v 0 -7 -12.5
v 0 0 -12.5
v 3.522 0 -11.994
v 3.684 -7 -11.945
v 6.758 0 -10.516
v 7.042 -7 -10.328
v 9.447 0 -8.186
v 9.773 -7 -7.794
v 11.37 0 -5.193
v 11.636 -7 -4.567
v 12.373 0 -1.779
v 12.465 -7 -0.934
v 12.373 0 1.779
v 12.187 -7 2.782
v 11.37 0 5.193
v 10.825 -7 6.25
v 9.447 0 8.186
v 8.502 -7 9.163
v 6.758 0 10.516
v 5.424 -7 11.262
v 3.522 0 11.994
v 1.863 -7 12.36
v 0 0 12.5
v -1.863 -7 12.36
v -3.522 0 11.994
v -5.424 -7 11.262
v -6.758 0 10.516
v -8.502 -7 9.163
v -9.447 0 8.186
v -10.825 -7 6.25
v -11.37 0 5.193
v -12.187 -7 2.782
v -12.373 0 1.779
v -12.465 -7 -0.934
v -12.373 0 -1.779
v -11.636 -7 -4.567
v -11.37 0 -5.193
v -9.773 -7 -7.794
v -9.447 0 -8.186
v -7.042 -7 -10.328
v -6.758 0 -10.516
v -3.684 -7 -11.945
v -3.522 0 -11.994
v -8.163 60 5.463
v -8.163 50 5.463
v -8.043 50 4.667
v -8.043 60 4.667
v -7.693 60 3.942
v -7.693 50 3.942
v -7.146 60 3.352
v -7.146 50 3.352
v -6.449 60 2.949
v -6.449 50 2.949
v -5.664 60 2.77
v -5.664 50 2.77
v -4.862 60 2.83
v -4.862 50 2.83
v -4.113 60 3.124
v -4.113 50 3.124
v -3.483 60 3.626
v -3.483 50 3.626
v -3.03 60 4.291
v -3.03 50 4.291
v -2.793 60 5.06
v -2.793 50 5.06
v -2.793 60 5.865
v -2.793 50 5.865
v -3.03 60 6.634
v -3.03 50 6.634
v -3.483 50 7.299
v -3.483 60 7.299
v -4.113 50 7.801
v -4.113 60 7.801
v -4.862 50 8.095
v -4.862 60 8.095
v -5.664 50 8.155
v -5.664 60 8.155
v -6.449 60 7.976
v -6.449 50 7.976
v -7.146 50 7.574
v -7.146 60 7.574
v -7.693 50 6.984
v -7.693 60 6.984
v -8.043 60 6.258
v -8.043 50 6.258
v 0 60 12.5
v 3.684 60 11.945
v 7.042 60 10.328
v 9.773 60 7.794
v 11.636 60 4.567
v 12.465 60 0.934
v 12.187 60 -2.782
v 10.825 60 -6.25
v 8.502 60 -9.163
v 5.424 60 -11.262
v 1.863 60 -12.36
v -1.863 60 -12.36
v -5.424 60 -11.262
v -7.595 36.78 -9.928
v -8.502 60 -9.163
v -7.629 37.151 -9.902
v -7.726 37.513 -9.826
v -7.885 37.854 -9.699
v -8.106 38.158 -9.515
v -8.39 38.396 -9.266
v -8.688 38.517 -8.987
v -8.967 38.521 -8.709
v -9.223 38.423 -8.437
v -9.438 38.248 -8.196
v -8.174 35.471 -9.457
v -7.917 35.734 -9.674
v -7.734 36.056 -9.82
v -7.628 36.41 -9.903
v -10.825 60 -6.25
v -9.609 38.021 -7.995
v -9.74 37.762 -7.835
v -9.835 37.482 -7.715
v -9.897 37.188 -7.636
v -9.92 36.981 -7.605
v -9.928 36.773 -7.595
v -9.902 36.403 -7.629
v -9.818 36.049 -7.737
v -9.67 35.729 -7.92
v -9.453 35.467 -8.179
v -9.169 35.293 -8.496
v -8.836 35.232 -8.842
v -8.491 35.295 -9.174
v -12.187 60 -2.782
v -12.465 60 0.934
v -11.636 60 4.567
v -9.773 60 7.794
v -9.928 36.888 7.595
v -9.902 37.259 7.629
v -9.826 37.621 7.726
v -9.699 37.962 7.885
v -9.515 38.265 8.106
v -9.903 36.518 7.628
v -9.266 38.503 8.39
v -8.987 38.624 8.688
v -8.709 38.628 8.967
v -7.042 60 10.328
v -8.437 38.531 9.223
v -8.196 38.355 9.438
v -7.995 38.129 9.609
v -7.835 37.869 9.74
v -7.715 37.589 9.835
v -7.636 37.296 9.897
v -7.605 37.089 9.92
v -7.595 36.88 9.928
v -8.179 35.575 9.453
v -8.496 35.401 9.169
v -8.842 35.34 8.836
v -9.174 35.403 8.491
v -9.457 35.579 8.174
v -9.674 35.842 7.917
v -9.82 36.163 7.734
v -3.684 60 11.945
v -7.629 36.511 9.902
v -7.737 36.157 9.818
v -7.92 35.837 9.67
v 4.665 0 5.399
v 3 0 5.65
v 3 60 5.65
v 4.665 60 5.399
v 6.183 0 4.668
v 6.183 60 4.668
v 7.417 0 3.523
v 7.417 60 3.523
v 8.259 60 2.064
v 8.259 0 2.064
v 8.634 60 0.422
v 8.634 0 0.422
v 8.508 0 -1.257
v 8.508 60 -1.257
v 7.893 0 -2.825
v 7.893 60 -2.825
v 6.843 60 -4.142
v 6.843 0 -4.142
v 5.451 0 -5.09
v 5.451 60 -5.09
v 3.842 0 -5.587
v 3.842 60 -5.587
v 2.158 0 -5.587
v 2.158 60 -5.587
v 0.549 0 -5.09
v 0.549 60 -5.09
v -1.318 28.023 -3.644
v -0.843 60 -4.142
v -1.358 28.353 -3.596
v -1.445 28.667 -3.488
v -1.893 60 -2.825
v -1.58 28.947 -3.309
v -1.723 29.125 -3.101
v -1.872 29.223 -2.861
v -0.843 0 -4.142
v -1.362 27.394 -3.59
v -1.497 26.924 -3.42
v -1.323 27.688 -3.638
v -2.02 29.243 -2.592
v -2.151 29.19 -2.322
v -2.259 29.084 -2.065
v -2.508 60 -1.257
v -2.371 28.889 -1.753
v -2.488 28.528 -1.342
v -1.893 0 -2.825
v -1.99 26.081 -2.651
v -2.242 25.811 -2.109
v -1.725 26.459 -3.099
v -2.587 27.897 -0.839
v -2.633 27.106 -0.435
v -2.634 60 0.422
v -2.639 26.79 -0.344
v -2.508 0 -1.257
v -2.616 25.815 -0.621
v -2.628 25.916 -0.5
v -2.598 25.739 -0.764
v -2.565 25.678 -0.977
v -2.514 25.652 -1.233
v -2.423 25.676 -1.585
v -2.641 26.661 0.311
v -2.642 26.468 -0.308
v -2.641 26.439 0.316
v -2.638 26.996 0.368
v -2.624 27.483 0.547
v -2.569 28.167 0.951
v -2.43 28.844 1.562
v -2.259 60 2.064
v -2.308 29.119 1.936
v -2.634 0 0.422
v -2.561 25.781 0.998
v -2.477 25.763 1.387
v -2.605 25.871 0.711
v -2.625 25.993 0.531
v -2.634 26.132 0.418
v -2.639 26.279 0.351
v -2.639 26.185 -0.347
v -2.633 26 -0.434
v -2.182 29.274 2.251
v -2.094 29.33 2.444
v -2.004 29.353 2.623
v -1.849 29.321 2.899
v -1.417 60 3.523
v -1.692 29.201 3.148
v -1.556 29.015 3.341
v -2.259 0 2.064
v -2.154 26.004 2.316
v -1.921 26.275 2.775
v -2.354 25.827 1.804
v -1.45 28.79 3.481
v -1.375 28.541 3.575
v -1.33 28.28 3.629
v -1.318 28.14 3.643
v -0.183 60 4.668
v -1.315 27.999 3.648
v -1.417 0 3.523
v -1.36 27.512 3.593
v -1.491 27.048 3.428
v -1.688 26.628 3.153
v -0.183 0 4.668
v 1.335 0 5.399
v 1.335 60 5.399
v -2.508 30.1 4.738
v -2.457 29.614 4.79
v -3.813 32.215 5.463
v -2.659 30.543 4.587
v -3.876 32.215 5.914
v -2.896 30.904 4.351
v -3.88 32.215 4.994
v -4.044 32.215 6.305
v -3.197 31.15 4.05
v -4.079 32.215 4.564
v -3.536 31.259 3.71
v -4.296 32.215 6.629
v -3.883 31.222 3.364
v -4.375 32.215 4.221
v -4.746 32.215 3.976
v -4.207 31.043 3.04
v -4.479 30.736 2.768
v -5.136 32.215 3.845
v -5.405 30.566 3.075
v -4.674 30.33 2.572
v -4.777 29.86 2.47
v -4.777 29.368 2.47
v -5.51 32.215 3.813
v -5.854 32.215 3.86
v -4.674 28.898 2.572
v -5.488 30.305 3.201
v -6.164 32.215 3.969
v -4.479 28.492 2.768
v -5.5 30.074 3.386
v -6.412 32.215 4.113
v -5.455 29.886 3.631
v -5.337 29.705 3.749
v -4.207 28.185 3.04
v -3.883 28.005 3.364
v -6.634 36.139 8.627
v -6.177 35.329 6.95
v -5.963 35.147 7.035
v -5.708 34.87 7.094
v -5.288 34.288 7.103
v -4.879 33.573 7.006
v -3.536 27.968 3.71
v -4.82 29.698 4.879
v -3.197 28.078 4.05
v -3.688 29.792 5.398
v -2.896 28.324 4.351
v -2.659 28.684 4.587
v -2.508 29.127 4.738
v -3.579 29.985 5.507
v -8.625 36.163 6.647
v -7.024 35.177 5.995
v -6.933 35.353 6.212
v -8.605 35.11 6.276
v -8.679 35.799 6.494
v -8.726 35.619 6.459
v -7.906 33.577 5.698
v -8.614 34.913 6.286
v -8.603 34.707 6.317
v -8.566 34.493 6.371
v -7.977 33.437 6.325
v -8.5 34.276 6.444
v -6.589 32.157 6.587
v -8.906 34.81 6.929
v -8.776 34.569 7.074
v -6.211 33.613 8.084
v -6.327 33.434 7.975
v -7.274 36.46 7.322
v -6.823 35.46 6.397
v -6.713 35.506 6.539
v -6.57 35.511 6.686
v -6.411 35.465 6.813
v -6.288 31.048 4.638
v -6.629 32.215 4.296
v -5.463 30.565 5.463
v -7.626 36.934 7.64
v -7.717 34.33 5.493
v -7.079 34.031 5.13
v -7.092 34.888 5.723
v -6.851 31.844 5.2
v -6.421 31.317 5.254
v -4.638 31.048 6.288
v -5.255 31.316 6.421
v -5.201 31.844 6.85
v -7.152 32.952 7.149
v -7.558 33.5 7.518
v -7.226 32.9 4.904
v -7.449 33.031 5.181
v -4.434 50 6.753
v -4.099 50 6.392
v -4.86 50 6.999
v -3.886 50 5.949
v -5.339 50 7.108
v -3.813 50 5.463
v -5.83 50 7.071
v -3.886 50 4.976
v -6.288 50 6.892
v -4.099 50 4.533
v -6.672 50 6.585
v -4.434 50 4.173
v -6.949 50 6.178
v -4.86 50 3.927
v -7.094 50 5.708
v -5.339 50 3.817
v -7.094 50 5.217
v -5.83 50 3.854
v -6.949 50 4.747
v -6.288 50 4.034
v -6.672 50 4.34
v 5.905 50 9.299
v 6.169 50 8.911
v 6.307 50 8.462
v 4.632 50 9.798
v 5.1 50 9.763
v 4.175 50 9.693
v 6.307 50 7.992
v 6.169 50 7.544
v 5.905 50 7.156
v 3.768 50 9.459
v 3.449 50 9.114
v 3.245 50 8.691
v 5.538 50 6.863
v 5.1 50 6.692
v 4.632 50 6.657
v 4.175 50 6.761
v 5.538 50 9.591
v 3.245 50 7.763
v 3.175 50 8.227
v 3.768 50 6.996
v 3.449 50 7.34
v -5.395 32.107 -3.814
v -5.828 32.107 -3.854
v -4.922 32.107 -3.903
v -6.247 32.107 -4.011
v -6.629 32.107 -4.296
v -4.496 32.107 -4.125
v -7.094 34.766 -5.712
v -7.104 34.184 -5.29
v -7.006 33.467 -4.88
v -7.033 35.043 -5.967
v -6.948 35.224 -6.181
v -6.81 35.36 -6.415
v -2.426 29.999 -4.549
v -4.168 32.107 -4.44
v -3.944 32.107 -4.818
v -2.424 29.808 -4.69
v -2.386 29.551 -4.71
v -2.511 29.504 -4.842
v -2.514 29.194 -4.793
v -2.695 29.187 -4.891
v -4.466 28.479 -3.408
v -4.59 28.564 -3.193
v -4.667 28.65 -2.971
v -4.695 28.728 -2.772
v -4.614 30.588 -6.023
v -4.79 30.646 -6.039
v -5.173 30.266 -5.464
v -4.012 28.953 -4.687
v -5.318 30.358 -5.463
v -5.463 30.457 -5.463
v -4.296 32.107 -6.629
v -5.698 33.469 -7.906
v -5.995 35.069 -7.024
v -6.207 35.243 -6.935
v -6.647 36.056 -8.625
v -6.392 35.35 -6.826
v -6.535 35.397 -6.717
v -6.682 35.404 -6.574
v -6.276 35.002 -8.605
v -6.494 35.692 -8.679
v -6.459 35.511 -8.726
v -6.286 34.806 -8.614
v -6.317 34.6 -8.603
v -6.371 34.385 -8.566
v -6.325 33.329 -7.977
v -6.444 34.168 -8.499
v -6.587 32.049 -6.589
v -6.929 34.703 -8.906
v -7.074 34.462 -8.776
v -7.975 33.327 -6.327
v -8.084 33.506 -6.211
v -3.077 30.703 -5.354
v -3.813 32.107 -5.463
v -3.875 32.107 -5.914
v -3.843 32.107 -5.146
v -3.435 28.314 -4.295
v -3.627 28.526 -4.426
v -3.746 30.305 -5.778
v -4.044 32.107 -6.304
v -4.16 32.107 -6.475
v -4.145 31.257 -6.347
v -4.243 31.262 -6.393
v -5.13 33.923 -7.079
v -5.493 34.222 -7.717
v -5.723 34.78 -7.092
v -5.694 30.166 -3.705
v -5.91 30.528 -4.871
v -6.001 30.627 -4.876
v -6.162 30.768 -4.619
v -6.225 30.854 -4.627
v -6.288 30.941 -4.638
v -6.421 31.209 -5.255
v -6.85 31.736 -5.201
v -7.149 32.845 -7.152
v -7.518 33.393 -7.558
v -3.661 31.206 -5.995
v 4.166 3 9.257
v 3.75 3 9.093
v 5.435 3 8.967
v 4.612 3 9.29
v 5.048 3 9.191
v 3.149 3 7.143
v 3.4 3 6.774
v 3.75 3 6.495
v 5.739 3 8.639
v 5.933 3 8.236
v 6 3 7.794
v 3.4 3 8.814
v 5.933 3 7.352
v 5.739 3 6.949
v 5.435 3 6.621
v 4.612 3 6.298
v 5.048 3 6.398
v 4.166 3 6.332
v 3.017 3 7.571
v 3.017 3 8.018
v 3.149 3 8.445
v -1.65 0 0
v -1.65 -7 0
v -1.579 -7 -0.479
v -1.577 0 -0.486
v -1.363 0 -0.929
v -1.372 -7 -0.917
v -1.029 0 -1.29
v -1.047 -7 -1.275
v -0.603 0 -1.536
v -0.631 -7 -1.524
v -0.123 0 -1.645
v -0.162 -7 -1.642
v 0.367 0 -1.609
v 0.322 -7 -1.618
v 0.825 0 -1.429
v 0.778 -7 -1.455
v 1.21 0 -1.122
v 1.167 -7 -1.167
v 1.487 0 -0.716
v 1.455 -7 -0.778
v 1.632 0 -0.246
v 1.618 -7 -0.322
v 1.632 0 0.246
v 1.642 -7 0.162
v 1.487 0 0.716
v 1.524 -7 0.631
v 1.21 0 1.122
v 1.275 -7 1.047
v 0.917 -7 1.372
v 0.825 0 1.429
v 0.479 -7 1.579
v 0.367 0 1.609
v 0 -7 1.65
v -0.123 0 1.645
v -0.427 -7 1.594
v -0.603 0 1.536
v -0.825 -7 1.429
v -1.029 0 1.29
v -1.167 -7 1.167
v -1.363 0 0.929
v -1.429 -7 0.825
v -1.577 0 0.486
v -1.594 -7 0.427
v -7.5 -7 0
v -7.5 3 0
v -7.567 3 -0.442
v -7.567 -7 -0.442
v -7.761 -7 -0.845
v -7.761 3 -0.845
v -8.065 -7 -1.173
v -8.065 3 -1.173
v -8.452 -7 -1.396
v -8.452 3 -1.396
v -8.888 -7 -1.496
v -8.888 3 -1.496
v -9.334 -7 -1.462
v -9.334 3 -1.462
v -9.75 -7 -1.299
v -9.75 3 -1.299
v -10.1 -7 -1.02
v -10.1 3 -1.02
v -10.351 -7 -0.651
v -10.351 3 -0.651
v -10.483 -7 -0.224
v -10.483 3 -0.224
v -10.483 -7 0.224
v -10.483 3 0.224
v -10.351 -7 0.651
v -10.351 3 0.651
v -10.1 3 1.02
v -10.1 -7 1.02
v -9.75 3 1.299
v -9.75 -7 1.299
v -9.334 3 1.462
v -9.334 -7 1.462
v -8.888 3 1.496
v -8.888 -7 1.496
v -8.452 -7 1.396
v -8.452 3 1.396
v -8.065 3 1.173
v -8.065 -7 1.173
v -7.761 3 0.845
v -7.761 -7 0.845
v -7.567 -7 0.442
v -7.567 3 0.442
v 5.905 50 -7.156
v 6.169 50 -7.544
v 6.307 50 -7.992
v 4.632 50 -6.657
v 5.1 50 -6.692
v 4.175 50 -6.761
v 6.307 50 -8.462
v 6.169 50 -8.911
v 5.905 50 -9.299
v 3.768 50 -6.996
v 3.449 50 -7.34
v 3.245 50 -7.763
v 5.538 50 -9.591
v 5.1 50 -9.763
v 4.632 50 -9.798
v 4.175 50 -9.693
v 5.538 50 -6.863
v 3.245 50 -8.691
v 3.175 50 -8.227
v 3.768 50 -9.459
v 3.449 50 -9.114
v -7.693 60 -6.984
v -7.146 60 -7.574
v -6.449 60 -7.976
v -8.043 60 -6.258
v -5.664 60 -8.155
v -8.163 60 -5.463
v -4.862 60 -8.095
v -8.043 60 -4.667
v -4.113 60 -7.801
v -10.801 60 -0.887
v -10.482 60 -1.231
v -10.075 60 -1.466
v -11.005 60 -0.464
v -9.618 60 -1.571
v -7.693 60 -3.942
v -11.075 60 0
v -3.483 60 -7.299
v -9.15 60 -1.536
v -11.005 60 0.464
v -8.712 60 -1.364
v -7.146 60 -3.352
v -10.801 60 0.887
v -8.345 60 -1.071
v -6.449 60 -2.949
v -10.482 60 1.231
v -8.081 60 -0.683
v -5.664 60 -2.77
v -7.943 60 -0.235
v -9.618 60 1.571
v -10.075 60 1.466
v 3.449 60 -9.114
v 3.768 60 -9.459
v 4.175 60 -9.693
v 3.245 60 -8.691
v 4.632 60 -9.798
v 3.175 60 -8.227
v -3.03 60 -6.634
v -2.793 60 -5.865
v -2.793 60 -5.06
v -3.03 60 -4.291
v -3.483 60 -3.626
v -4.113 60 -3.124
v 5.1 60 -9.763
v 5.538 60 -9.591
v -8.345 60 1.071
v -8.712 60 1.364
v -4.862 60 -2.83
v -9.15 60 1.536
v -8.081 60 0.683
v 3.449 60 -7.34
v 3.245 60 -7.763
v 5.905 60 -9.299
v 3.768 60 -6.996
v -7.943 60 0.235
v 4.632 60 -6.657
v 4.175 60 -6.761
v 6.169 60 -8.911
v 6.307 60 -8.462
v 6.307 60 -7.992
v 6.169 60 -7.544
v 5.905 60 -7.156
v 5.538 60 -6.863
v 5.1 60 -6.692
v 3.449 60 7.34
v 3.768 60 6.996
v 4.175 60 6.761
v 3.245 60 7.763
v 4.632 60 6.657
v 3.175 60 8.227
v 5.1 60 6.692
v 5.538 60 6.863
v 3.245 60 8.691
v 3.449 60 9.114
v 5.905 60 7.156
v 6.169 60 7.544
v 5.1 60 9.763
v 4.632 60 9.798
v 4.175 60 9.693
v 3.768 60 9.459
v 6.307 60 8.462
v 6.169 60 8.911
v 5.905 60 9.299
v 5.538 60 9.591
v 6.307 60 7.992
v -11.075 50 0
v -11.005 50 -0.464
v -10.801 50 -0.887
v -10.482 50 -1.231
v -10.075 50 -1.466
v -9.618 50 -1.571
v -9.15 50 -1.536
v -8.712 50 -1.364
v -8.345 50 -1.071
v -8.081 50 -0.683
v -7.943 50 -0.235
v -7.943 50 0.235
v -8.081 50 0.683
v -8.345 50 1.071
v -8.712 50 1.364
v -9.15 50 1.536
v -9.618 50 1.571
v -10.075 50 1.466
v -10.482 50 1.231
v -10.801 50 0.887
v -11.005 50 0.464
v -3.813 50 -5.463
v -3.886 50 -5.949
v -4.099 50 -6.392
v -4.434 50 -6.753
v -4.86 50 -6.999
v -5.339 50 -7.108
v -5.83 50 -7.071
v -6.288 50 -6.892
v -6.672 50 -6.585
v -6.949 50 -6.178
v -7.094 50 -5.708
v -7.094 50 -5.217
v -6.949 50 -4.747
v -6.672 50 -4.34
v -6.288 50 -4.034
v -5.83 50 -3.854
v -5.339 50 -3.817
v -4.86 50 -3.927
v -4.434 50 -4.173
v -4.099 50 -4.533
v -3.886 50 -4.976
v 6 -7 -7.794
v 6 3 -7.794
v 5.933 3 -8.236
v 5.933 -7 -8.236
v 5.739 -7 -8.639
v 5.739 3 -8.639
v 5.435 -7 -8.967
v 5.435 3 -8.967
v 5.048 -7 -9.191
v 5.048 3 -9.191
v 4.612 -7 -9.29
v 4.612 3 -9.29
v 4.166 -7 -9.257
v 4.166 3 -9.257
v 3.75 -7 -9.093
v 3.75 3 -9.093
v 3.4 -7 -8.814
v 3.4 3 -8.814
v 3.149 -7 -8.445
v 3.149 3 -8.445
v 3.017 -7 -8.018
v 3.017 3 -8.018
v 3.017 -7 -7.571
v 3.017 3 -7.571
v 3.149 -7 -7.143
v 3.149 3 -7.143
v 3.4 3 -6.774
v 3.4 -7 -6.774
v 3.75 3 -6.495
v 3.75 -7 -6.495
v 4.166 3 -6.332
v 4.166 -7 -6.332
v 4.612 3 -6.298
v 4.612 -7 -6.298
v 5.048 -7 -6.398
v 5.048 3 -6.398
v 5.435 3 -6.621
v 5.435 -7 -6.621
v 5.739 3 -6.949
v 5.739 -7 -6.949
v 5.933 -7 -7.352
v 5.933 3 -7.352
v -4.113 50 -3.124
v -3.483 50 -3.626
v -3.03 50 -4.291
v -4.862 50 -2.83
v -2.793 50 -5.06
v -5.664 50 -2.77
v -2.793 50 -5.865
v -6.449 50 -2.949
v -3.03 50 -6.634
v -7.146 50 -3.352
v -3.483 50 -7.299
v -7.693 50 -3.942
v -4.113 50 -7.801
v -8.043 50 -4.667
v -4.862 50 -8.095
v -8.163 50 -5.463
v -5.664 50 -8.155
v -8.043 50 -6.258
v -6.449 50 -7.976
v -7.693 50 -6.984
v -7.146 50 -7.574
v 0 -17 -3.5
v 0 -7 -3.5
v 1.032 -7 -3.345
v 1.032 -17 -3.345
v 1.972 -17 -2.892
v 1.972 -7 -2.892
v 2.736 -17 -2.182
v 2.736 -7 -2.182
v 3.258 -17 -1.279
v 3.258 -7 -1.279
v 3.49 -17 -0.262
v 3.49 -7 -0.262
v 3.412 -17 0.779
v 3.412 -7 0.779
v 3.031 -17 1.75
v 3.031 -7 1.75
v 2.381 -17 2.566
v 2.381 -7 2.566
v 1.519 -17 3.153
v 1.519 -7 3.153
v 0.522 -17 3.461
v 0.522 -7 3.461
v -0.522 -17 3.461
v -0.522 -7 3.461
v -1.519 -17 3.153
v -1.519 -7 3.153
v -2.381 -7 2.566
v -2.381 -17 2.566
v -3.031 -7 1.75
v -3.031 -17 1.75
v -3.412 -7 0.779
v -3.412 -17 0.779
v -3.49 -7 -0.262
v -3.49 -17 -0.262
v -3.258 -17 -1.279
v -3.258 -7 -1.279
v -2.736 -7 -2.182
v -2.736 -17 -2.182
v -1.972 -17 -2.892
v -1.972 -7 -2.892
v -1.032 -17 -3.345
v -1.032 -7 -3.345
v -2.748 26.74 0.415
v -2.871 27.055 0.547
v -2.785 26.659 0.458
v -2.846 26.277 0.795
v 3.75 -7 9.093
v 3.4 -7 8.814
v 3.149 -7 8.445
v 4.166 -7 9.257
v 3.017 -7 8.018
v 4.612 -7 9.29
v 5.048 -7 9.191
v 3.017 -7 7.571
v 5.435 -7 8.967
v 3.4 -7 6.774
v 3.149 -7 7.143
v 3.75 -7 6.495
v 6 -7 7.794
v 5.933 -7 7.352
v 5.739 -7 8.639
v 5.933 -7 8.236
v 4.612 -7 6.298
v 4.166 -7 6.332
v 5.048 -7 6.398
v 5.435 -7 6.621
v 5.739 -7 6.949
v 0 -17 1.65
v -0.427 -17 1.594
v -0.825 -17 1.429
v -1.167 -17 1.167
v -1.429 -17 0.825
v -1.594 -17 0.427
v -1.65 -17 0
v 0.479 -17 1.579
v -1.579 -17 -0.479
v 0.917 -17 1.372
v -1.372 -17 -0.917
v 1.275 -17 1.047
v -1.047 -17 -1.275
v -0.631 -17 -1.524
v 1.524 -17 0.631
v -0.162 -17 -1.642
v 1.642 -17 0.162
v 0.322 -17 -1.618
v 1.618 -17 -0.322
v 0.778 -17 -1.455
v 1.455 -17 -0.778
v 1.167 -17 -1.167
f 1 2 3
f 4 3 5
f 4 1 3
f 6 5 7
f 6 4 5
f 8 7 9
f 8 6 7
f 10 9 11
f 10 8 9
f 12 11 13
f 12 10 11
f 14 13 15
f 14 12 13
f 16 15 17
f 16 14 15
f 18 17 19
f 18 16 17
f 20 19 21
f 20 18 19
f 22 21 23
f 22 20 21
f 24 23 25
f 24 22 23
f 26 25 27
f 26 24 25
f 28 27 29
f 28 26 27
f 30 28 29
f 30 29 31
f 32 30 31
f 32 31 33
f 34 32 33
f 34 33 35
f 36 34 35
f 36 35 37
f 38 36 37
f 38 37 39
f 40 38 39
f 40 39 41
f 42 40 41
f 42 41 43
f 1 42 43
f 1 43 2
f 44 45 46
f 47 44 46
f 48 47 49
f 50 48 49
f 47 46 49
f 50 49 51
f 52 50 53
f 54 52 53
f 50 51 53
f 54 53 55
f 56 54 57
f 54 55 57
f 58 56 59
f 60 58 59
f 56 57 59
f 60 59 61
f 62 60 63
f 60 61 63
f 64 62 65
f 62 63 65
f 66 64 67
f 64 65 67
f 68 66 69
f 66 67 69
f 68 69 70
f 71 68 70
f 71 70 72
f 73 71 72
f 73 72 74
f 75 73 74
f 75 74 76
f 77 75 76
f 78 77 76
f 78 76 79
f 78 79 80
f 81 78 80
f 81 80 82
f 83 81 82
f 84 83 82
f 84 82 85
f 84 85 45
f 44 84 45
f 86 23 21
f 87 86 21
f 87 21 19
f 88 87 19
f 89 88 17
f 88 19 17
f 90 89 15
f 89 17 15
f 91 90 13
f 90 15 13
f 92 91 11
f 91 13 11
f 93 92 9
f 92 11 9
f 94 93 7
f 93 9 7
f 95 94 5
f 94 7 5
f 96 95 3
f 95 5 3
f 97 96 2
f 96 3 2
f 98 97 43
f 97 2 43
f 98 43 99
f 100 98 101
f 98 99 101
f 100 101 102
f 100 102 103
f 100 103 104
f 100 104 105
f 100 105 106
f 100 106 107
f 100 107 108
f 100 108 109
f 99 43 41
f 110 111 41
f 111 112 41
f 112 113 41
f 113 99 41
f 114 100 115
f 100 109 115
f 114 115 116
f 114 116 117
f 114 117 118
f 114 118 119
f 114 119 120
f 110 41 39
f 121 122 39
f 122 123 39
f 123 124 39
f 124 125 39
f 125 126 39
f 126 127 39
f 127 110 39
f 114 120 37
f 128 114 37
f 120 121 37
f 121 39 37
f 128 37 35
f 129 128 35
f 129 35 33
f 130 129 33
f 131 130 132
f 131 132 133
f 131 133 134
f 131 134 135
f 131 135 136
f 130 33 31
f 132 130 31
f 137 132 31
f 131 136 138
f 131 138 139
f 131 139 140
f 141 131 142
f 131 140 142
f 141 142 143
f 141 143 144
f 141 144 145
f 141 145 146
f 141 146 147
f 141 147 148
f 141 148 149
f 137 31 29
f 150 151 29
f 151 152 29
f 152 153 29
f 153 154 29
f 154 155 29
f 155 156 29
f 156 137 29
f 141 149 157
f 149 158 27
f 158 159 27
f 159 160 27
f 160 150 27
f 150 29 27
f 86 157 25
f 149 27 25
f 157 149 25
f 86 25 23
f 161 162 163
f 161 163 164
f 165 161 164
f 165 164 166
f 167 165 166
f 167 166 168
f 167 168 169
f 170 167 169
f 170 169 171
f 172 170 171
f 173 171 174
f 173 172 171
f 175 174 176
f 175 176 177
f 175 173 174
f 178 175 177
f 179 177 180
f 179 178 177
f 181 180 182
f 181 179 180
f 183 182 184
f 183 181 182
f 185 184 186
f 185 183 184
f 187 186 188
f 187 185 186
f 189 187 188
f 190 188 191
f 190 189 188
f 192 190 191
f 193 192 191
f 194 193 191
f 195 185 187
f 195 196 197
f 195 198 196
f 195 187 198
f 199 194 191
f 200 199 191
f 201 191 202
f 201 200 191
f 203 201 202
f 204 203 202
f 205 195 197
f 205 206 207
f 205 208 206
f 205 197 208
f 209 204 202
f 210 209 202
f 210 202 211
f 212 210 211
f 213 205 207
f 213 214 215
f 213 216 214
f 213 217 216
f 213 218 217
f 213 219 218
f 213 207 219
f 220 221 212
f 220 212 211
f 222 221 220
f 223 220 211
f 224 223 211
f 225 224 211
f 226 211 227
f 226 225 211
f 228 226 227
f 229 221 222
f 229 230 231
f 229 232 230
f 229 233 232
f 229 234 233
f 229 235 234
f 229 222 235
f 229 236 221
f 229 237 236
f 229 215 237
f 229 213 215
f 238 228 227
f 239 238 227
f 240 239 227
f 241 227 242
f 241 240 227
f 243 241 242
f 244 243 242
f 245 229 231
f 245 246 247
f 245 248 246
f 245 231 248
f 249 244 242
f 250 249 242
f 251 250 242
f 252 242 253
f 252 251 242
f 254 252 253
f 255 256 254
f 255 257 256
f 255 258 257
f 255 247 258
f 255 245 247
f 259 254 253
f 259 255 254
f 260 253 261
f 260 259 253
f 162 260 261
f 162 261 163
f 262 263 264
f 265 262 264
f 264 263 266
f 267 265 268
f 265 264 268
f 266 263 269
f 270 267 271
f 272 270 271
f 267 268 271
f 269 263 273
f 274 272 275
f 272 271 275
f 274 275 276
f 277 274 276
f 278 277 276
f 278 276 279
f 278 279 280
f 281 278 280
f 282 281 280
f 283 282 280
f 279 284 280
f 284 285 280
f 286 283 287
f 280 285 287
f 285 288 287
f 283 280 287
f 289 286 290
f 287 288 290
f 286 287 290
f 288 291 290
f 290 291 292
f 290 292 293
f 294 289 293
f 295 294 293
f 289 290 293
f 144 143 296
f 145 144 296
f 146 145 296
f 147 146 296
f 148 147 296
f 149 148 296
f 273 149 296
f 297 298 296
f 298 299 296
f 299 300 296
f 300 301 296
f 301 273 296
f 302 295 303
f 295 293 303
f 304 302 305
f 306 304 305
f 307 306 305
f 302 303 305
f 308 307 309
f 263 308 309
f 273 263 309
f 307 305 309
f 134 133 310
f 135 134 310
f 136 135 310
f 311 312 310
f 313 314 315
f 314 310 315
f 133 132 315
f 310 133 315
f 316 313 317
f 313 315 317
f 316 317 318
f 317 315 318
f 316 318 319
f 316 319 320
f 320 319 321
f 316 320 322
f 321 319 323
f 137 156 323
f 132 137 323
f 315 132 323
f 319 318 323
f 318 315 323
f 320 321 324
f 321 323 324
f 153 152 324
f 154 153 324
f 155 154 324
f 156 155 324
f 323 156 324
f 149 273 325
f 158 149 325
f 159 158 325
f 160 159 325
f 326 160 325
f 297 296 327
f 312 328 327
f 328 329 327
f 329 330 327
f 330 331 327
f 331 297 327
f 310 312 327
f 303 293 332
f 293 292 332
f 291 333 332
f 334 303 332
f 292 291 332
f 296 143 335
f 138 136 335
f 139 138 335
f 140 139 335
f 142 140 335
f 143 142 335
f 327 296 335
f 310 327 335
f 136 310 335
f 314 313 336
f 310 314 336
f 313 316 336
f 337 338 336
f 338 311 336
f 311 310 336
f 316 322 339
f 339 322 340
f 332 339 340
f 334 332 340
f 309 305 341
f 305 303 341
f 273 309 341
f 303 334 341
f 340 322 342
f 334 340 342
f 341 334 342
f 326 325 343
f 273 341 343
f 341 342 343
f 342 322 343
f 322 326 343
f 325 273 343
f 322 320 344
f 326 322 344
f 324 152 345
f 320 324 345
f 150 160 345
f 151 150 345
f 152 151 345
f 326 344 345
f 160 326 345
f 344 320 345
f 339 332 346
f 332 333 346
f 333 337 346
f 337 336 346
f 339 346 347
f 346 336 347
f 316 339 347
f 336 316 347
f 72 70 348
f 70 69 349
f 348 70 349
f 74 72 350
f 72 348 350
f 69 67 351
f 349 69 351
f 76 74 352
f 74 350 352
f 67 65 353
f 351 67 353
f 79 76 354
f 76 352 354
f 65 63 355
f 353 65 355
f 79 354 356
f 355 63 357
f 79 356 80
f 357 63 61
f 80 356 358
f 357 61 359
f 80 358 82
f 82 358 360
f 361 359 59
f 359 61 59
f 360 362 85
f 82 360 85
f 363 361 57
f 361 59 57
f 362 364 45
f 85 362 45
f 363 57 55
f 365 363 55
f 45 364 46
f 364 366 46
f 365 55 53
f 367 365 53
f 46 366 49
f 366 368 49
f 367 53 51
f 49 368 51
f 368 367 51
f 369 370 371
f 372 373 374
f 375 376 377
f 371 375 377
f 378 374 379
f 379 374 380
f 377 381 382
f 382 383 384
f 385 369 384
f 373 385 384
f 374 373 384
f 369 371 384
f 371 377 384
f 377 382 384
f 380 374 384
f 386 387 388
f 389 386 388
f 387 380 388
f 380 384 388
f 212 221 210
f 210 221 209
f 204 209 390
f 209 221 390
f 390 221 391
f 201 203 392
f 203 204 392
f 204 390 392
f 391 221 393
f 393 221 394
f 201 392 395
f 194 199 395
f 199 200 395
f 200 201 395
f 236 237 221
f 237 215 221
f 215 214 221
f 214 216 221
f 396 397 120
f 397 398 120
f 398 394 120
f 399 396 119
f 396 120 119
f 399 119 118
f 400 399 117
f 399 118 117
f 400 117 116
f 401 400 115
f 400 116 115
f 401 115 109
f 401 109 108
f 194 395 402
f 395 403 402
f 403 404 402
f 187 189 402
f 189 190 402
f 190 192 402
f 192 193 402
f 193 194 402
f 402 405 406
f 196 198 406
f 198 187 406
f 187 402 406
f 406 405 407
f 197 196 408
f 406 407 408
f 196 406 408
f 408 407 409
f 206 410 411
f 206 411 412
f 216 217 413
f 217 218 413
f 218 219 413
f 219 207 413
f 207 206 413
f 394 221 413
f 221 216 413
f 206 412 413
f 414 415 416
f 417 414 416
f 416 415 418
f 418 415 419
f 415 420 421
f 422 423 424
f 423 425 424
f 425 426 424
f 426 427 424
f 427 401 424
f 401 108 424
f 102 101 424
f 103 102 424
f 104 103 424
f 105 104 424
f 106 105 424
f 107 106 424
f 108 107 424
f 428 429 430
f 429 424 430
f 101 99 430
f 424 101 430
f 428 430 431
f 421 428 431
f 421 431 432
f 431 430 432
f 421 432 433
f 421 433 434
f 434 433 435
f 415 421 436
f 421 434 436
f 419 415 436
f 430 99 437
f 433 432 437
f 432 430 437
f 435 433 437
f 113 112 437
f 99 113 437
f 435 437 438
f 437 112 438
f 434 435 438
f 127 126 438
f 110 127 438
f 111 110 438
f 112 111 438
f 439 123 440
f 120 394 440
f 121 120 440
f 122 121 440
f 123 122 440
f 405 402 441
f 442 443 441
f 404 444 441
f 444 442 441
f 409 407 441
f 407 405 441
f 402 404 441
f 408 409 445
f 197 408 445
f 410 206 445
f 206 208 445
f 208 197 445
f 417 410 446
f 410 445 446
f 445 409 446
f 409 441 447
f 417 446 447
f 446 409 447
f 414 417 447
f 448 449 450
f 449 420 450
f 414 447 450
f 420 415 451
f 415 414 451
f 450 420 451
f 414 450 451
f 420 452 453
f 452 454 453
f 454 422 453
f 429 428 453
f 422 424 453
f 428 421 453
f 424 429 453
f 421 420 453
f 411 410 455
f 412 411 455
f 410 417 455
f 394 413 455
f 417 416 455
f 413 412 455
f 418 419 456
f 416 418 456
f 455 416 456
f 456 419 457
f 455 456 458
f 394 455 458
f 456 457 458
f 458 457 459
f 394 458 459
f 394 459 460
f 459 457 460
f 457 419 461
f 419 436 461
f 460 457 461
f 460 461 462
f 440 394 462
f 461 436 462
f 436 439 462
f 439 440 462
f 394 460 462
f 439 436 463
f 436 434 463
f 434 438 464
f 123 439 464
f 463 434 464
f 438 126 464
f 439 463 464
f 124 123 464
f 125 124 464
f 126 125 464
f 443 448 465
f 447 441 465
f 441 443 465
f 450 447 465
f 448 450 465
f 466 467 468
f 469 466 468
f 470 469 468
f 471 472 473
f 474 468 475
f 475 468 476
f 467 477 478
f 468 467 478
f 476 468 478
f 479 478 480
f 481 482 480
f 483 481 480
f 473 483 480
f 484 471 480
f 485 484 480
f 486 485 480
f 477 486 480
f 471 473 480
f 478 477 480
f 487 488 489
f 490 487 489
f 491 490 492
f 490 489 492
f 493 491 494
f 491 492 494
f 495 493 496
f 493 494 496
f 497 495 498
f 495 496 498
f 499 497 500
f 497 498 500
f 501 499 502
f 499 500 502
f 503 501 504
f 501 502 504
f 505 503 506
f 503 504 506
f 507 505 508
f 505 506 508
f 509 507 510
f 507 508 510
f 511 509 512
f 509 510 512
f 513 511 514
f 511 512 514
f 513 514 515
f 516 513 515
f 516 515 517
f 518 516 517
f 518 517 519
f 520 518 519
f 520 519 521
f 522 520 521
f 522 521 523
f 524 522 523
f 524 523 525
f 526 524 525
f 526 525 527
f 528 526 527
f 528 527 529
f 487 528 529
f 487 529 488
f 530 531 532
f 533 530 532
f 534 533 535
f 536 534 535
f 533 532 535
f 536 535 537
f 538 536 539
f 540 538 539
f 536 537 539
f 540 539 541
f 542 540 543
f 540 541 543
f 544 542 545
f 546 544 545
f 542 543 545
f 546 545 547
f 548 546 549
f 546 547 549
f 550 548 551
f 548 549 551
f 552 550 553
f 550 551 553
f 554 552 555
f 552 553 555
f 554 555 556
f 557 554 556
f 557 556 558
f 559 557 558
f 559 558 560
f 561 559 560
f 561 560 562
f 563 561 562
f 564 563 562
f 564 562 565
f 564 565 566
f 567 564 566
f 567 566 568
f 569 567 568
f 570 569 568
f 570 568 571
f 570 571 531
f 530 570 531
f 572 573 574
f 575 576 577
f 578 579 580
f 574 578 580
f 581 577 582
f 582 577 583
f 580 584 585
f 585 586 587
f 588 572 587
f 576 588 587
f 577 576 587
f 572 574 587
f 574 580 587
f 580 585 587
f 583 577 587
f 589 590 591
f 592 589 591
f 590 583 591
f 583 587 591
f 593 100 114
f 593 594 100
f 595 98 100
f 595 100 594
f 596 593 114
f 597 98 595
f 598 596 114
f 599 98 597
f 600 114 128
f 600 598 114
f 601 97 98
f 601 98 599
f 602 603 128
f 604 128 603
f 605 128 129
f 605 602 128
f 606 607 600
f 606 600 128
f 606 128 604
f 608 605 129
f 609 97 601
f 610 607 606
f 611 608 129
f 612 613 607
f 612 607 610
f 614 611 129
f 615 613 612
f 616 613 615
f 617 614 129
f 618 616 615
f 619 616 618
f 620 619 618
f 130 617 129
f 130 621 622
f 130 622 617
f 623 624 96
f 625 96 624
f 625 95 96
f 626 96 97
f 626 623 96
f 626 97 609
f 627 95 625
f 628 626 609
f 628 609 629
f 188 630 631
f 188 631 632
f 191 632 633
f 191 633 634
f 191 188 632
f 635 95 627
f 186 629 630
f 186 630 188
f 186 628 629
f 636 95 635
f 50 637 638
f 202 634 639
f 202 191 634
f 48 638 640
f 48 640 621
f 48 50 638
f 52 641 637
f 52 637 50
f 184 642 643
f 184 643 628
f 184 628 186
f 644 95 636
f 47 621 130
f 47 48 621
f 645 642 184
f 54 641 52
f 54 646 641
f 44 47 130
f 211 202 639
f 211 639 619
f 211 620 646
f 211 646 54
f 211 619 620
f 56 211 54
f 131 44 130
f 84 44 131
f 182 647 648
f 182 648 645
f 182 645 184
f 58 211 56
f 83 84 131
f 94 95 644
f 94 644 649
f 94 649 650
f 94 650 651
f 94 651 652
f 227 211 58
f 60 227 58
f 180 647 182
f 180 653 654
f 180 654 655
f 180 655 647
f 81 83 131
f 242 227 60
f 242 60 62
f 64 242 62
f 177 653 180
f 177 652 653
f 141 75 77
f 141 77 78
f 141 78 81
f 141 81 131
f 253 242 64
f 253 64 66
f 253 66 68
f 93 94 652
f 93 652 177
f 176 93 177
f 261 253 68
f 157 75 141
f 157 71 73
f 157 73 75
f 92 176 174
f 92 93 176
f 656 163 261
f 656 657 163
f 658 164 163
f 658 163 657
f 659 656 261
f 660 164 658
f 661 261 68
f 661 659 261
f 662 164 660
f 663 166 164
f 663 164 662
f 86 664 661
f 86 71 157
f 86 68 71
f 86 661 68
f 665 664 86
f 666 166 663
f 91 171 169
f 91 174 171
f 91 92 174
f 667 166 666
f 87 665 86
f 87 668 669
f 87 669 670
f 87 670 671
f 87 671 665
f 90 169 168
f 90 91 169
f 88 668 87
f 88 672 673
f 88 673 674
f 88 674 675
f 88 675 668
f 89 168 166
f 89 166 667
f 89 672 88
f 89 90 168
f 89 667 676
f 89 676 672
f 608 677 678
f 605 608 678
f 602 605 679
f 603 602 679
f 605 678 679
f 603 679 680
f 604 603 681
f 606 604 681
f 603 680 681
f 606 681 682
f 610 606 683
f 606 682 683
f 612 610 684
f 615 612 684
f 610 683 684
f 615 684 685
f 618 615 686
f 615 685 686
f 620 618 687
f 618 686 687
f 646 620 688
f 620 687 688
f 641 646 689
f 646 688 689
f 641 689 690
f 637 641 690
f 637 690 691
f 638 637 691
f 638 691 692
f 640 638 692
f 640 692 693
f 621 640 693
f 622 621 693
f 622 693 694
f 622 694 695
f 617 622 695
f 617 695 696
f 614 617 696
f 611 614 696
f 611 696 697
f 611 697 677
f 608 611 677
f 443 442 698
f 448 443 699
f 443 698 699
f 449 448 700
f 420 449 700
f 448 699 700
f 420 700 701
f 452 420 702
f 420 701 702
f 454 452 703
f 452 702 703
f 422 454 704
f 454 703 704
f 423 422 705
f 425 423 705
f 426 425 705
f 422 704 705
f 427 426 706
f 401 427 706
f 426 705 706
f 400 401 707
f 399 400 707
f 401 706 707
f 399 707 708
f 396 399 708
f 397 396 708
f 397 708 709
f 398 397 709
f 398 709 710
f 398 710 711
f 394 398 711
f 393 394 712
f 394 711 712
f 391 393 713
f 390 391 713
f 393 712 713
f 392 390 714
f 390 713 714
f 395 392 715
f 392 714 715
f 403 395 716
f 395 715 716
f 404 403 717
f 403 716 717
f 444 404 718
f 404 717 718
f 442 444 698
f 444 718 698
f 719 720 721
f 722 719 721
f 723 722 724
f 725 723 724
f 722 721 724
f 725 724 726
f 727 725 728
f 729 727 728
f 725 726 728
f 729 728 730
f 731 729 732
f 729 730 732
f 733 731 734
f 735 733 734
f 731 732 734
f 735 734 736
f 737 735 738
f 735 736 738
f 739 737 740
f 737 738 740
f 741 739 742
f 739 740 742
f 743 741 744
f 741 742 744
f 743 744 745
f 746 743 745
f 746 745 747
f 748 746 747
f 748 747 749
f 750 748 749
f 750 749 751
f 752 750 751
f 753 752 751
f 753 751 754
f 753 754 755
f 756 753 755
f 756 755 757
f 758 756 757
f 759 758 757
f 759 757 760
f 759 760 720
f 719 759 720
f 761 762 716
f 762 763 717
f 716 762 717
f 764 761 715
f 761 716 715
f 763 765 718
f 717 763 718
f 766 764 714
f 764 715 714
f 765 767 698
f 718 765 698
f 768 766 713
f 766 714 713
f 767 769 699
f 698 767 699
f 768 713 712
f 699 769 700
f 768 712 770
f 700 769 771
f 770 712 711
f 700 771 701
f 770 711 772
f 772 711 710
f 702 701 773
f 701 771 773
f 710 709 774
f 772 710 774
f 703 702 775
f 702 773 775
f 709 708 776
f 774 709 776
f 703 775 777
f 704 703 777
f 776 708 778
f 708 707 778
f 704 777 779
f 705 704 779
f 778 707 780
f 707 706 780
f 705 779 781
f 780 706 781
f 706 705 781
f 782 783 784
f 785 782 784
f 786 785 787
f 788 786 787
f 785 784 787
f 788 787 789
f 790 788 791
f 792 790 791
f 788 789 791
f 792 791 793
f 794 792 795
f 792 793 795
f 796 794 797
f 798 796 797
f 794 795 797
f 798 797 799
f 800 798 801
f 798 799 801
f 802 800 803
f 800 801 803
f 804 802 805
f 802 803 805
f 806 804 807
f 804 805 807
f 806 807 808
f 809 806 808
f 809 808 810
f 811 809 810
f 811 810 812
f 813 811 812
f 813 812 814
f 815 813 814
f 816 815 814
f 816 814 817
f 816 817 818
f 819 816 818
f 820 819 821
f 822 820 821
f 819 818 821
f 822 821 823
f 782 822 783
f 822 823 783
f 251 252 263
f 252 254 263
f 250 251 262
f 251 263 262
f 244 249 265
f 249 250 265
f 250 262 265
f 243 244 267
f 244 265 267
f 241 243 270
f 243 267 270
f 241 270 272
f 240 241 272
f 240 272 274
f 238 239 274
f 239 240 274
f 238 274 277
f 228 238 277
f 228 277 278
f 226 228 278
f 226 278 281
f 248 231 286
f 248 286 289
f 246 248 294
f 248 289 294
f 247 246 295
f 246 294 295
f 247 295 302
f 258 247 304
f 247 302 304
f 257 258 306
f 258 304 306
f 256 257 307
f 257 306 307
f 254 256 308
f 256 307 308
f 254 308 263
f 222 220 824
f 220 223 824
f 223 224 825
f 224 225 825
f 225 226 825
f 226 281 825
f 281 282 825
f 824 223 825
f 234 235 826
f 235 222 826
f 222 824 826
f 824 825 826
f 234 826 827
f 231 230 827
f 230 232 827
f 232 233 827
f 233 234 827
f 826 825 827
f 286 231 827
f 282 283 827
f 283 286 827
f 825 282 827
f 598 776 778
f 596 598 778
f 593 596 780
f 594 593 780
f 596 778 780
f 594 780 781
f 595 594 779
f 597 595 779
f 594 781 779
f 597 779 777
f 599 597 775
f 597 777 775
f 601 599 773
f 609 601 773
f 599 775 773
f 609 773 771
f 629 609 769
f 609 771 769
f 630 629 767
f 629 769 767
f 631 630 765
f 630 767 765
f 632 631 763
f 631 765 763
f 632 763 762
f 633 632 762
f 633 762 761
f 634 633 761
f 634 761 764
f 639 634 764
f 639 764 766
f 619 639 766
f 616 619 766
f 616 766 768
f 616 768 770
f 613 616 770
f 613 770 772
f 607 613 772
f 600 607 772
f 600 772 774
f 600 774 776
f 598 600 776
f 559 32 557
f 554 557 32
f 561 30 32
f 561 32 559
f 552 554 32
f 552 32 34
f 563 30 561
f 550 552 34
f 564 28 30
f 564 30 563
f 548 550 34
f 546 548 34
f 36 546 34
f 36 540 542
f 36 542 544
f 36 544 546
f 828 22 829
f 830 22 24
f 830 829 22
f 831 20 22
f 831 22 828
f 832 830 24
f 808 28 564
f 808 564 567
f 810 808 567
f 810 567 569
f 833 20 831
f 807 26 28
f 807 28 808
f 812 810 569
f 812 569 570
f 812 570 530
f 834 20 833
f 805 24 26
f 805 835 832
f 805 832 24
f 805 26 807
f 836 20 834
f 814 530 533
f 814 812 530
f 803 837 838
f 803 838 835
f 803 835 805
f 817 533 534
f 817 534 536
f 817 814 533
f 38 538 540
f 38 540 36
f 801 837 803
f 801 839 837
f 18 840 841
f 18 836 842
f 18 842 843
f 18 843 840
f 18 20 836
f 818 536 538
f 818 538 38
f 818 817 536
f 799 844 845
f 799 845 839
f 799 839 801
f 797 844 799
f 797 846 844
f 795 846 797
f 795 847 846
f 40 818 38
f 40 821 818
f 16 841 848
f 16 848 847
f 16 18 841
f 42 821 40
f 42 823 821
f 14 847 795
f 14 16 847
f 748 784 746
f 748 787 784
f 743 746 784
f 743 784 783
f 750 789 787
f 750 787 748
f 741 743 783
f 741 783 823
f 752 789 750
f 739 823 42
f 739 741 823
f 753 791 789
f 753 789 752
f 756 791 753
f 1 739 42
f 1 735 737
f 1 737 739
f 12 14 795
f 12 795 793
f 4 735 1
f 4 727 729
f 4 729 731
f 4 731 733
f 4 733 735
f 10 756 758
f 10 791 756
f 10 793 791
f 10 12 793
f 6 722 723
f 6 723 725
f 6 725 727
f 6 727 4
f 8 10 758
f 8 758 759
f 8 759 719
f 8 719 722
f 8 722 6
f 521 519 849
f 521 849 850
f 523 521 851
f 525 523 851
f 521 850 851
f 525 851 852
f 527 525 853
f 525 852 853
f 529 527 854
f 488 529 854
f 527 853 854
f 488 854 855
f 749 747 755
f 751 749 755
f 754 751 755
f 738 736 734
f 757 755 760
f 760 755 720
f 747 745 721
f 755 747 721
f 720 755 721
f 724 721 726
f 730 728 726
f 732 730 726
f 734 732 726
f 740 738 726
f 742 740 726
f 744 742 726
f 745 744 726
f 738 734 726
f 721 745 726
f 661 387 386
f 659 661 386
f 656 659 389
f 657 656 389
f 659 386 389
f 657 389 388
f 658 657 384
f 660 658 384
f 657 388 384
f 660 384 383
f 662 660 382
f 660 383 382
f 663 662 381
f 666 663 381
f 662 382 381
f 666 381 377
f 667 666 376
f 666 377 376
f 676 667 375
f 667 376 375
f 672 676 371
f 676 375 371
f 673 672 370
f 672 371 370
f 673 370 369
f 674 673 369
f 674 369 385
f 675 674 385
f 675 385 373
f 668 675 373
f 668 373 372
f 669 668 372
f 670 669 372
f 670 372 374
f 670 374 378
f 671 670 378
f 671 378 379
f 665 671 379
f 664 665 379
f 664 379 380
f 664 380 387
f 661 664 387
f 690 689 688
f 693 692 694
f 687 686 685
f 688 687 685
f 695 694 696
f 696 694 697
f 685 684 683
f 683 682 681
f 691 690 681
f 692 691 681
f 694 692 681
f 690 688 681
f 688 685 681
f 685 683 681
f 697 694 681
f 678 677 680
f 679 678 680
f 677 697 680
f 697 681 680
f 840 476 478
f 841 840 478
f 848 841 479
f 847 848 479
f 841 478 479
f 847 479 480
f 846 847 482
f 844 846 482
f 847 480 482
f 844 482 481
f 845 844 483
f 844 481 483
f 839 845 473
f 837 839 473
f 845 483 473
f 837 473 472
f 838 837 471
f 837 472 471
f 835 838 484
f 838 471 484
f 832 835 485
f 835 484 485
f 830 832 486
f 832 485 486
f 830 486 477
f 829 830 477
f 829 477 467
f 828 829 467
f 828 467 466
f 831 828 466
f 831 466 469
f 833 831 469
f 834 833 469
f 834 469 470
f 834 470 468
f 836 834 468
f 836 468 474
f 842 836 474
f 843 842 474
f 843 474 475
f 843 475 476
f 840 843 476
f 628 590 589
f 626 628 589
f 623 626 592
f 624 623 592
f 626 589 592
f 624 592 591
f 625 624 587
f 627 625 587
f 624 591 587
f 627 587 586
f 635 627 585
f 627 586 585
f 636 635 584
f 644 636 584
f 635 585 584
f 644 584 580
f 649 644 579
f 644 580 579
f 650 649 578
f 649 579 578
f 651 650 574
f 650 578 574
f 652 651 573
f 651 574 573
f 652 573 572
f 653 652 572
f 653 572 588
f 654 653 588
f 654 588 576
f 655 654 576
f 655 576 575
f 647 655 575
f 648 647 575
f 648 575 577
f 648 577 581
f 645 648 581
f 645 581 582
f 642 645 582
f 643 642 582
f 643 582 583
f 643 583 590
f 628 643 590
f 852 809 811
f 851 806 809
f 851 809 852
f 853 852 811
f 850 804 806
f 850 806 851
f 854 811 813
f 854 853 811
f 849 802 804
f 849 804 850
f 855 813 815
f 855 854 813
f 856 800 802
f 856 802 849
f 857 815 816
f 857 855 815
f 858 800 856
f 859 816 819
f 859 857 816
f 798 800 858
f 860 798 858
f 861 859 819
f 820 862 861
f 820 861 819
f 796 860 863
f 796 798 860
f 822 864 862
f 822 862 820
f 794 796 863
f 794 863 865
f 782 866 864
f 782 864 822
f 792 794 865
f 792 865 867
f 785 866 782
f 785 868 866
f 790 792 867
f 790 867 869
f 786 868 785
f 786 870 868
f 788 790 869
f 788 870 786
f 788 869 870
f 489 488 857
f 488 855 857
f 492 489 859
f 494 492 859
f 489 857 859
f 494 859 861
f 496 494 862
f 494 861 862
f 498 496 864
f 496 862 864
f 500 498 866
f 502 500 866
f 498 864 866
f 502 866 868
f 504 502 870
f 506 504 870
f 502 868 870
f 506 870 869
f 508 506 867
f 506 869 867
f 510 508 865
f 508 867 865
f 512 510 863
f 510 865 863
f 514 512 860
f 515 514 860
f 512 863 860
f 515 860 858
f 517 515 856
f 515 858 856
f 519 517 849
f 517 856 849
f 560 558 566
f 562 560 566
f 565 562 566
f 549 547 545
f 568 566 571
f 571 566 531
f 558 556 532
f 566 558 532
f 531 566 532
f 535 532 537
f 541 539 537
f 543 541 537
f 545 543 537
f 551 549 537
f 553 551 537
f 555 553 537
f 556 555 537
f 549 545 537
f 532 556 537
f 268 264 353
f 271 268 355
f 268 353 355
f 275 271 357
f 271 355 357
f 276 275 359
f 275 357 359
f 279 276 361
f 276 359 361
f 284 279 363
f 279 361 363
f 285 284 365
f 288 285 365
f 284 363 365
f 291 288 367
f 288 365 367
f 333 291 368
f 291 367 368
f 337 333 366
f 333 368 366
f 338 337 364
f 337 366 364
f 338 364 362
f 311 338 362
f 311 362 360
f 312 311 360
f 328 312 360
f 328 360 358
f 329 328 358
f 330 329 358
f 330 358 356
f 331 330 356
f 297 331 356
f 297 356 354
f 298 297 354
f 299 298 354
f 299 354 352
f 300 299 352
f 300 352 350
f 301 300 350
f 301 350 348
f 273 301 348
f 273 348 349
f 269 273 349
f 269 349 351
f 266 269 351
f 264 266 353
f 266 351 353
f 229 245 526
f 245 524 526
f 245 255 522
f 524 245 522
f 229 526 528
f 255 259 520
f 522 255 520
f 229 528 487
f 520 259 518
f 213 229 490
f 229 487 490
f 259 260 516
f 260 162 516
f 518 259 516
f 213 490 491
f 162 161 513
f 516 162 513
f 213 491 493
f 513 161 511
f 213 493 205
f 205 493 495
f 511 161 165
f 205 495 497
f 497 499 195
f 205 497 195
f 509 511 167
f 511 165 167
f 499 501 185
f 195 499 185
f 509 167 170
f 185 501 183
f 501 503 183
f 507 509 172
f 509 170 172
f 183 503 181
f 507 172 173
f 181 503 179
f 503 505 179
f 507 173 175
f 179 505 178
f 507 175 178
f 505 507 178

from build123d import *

# Parameters (mm, degrees)
SKETCH1_R                        = 12.5
SKETCH1_R_2                      = 5.65
BOSS_EXTRUDE1_DEPTH              = 60
F_6_0MM_DOWEL_HOLE1_D            = 5.4
F_6_0MM_DOWEL_HOLE1_DEPTH        = 10
TAP_DRILL_FOR_M3_HELICOIL1_D     = 3.15
TAP_DRILL_FOR_M3_HELICOIL1_DEPTH = 10
BOSS_EXTRUDE2_START              = 7
SKETCH17_R                       = 12.5
BOSS_EXTRUDE2_DEPTH              = 7
SKETCH18_R                       = 3.5
BOSS_EXTRUDE3_DEPTH              = 10
SKETCH20_W                       = 1.65
SKETCH20_H                       = 10
F_3_0MM_DOWEL_HOLE2_D            = 3.3
SKETCH24_R                       = 1.65
SKETCH27_R                       = 1.65
F_6_0MM_DOWEL_HOLE2_REACH        = 71.293
F_6_0MM_DOWEL_HOLE2_BORE_R       = 1.65
F_6_0MM_DOWEL_HOLE3_REACH        = 71.293
F_6_0MM_DOWEL_HOLE3_BORE_R       = 1.65
F_6_0MM_DOWEL_HOLE4_D            = 3
F_6_0MM_DOWEL_HOLE4_DEPTH        = 10


with BuildPart() as part:
    # Sketch1 → Boss-Extrude1 (new body)
    with BuildSketch(Plane(origin=(0, 0, 0), x_dir=(1, 0, 0), z_dir=(0, 1, 0))):
        with Locations(Location((0, 0, 0), (0, 0, 270))):
            Circle(SKETCH1_R)
        with Locations(Location((3, 0, 0), (0, 0, 270))):
            Circle(SKETCH1_R_2, mode=Mode.SUBTRACT)
    extrude(amount=BOSS_EXTRUDE1_DEPTH)

    # Ø6.0mm Dowel Hole1
    with Locations(Plane(origin=(0, 60, 0), x_dir=(1, 0, 0), z_dir=(0, 1, 0))):
        with Locations((-5.462566323, 5.462566323), (-5.462566323, -5.462566323)):
            Hole(F_6_0MM_DOWEL_HOLE1_D / 2, depth=F_6_0MM_DOWEL_HOLE1_DEPTH)

    # Tap Drill for M3 Helicoil1
    with Locations(Plane(origin=(0, 60, 0), x_dir=(1, 0, 0), z_dir=(0, 1, 0))):
        with Locations((4.75, 8.227241336), (4.75, -8.227241336), (-9.5, 0)):
            Hole(TAP_DRILL_FOR_M3_HELICOIL1_D / 2, depth=TAP_DRILL_FOR_M3_HELICOIL1_DEPTH)

    # Sketch17 → Boss-Extrude2 (add)
    with BuildSketch(Plane.XZ.offset(BOSS_EXTRUDE2_START)):
        with Locations(Location((0, 0, 0), (0, 0, 270))):
            Circle(SKETCH17_R)
    extrude(amount=-BOSS_EXTRUDE2_DEPTH)

    # Sketch18 → Boss-Extrude3 (add)
    with BuildSketch(Plane.XZ.offset(7)):
        with Locations(Location((0, 0, 0), (0, 0, 270))):
            Circle(SKETCH18_R)
    extrude(amount=BOSS_EXTRUDE3_DEPTH)

    # Sketch20 → Ø3.0mm Dowel Hole1 (revolve, cut)
    with BuildSketch(Plane(origin=(0, -7, 0), x_dir=(0, 0, 1), z_dir=(1, 0, 0))):
        with Locations((0.825, 5)):
            Rectangle(SKETCH20_W, SKETCH20_H)
    revolve(axis=Axis((0, -0.65, 0), (0, -1, 0)), mode=Mode.SUBTRACT)

    # Ø3.0mm Dowel Hole2 (through all)
    with Locations(Plane(origin=(0, 0, 0), x_dir=(1, 0, 0), z_dir=(0, 1, 0))):
        with Locations((0, 0)):
            Hole(F_3_0MM_DOWEL_HOLE2_D / 2)

    # Cut-Sweep5: sweep along a curve in space
    with BuildLine() as cut_sweep5_path:
        Line((0, 24.869183639, 0), (-8.875394659, 37.420887137, -8.875394659))
    # Sketch24 → Cut-Sweep5 (sweep, cut)
    with BuildSketch(Plane(origin=(-8.838834765, 0, -8.838834765), x_dir=(-0.7071067811865462, 0, 0.7071067811865488), z_dir=(-0.7071067811865488, 0, -0.7071067811865462))):
        with Locations((0, 36.882111372)):
            Circle(SKETCH24_R)
    sweep(path=cut_sweep5_path.line, mode=Mode.SUBTRACT)

    # Cut-Sweep6: sweep along a curve in space
    with BuildLine() as cut_sweep6_path:
        Line((-3.623287534, 30, 3.623287534), (-12.526142338, 42.590538007, 12.526142338))
        Line((-3.623287534, 30, 3.623287534), (0, 24.875897629, 0))
    # Sketch27 → Cut-Sweep6 (sweep, cut)
    with BuildSketch(Plane(origin=(-8.838834765, 0, 8.838834765), x_dir=(0.7071067811865488, 0, 0.7071067811865462), z_dir=(-0.7071067811865462, 0, 0.7071067811865488))):
        with Locations((0, 36.98969213)):
            Circle(SKETCH27_R)
    sweep(path=cut_sweep6_path.line, mode=Mode.SUBTRACT)

    # Ø6.0mm Dowel Hole2 bore → Ø6.0mm Dowel Hole2 (cut, up to next)
    with BuildSketch(Plane(origin=(0, 50, 0), x_dir=(1, 0, 0), z_dir=(0, 1, 0)), mode=Mode.PRIVATE) as f_6_0mm_dowel_hole2_sk1:
        with Locations((-5.462566323, 5.462566323)):
            Circle(F_6_0MM_DOWEL_HOLE2_BORE_R)
    f_6_0mm_dowel_hole2_tool1 = extrude(f_6_0mm_dowel_hole2_sk1.sketch, amount=-F_6_0MM_DOWEL_HOLE2_REACH, mode=Mode.PRIVATE) & part.part
    add(f_6_0mm_dowel_hole2_tool1.solids().sort_by_distance((-5.462566, 50, -5.462566))[0], mode=Mode.SUBTRACT)

    # Ø6.0mm Dowel Hole3 bore → Ø6.0mm Dowel Hole3 (cut, up to next)
    with BuildSketch(Plane(origin=(0, 50, 0), x_dir=(1, 0, 0), z_dir=(0, 1, 0)), mode=Mode.PRIVATE) as f_6_0mm_dowel_hole3_sk1:
        with Locations((-5.462566323, -5.462566323)):
            Circle(F_6_0MM_DOWEL_HOLE3_BORE_R)
    f_6_0mm_dowel_hole3_tool1 = extrude(f_6_0mm_dowel_hole3_sk1.sketch, amount=-F_6_0MM_DOWEL_HOLE3_REACH, mode=Mode.PRIVATE) & part.part
    add(f_6_0mm_dowel_hole3_tool1.solids().sort_by_distance((-5.462566, 50, 5.462566))[0], mode=Mode.SUBTRACT)

    # Ø6.0mm Dowel Hole4
    with Locations(Plane(origin=(0, -7, 0), x_dir=(-1, 0, 0), z_dir=(0, -1, 0))):
        with Locations((-4.5, -7.794228634), (9, 0), (-4.5, 7.794228634)):
            Hole(F_6_0MM_DOWEL_HOLE4_D / 2, depth=F_6_0MM_DOWEL_HOLE4_DEPTH)


solid = part.part
